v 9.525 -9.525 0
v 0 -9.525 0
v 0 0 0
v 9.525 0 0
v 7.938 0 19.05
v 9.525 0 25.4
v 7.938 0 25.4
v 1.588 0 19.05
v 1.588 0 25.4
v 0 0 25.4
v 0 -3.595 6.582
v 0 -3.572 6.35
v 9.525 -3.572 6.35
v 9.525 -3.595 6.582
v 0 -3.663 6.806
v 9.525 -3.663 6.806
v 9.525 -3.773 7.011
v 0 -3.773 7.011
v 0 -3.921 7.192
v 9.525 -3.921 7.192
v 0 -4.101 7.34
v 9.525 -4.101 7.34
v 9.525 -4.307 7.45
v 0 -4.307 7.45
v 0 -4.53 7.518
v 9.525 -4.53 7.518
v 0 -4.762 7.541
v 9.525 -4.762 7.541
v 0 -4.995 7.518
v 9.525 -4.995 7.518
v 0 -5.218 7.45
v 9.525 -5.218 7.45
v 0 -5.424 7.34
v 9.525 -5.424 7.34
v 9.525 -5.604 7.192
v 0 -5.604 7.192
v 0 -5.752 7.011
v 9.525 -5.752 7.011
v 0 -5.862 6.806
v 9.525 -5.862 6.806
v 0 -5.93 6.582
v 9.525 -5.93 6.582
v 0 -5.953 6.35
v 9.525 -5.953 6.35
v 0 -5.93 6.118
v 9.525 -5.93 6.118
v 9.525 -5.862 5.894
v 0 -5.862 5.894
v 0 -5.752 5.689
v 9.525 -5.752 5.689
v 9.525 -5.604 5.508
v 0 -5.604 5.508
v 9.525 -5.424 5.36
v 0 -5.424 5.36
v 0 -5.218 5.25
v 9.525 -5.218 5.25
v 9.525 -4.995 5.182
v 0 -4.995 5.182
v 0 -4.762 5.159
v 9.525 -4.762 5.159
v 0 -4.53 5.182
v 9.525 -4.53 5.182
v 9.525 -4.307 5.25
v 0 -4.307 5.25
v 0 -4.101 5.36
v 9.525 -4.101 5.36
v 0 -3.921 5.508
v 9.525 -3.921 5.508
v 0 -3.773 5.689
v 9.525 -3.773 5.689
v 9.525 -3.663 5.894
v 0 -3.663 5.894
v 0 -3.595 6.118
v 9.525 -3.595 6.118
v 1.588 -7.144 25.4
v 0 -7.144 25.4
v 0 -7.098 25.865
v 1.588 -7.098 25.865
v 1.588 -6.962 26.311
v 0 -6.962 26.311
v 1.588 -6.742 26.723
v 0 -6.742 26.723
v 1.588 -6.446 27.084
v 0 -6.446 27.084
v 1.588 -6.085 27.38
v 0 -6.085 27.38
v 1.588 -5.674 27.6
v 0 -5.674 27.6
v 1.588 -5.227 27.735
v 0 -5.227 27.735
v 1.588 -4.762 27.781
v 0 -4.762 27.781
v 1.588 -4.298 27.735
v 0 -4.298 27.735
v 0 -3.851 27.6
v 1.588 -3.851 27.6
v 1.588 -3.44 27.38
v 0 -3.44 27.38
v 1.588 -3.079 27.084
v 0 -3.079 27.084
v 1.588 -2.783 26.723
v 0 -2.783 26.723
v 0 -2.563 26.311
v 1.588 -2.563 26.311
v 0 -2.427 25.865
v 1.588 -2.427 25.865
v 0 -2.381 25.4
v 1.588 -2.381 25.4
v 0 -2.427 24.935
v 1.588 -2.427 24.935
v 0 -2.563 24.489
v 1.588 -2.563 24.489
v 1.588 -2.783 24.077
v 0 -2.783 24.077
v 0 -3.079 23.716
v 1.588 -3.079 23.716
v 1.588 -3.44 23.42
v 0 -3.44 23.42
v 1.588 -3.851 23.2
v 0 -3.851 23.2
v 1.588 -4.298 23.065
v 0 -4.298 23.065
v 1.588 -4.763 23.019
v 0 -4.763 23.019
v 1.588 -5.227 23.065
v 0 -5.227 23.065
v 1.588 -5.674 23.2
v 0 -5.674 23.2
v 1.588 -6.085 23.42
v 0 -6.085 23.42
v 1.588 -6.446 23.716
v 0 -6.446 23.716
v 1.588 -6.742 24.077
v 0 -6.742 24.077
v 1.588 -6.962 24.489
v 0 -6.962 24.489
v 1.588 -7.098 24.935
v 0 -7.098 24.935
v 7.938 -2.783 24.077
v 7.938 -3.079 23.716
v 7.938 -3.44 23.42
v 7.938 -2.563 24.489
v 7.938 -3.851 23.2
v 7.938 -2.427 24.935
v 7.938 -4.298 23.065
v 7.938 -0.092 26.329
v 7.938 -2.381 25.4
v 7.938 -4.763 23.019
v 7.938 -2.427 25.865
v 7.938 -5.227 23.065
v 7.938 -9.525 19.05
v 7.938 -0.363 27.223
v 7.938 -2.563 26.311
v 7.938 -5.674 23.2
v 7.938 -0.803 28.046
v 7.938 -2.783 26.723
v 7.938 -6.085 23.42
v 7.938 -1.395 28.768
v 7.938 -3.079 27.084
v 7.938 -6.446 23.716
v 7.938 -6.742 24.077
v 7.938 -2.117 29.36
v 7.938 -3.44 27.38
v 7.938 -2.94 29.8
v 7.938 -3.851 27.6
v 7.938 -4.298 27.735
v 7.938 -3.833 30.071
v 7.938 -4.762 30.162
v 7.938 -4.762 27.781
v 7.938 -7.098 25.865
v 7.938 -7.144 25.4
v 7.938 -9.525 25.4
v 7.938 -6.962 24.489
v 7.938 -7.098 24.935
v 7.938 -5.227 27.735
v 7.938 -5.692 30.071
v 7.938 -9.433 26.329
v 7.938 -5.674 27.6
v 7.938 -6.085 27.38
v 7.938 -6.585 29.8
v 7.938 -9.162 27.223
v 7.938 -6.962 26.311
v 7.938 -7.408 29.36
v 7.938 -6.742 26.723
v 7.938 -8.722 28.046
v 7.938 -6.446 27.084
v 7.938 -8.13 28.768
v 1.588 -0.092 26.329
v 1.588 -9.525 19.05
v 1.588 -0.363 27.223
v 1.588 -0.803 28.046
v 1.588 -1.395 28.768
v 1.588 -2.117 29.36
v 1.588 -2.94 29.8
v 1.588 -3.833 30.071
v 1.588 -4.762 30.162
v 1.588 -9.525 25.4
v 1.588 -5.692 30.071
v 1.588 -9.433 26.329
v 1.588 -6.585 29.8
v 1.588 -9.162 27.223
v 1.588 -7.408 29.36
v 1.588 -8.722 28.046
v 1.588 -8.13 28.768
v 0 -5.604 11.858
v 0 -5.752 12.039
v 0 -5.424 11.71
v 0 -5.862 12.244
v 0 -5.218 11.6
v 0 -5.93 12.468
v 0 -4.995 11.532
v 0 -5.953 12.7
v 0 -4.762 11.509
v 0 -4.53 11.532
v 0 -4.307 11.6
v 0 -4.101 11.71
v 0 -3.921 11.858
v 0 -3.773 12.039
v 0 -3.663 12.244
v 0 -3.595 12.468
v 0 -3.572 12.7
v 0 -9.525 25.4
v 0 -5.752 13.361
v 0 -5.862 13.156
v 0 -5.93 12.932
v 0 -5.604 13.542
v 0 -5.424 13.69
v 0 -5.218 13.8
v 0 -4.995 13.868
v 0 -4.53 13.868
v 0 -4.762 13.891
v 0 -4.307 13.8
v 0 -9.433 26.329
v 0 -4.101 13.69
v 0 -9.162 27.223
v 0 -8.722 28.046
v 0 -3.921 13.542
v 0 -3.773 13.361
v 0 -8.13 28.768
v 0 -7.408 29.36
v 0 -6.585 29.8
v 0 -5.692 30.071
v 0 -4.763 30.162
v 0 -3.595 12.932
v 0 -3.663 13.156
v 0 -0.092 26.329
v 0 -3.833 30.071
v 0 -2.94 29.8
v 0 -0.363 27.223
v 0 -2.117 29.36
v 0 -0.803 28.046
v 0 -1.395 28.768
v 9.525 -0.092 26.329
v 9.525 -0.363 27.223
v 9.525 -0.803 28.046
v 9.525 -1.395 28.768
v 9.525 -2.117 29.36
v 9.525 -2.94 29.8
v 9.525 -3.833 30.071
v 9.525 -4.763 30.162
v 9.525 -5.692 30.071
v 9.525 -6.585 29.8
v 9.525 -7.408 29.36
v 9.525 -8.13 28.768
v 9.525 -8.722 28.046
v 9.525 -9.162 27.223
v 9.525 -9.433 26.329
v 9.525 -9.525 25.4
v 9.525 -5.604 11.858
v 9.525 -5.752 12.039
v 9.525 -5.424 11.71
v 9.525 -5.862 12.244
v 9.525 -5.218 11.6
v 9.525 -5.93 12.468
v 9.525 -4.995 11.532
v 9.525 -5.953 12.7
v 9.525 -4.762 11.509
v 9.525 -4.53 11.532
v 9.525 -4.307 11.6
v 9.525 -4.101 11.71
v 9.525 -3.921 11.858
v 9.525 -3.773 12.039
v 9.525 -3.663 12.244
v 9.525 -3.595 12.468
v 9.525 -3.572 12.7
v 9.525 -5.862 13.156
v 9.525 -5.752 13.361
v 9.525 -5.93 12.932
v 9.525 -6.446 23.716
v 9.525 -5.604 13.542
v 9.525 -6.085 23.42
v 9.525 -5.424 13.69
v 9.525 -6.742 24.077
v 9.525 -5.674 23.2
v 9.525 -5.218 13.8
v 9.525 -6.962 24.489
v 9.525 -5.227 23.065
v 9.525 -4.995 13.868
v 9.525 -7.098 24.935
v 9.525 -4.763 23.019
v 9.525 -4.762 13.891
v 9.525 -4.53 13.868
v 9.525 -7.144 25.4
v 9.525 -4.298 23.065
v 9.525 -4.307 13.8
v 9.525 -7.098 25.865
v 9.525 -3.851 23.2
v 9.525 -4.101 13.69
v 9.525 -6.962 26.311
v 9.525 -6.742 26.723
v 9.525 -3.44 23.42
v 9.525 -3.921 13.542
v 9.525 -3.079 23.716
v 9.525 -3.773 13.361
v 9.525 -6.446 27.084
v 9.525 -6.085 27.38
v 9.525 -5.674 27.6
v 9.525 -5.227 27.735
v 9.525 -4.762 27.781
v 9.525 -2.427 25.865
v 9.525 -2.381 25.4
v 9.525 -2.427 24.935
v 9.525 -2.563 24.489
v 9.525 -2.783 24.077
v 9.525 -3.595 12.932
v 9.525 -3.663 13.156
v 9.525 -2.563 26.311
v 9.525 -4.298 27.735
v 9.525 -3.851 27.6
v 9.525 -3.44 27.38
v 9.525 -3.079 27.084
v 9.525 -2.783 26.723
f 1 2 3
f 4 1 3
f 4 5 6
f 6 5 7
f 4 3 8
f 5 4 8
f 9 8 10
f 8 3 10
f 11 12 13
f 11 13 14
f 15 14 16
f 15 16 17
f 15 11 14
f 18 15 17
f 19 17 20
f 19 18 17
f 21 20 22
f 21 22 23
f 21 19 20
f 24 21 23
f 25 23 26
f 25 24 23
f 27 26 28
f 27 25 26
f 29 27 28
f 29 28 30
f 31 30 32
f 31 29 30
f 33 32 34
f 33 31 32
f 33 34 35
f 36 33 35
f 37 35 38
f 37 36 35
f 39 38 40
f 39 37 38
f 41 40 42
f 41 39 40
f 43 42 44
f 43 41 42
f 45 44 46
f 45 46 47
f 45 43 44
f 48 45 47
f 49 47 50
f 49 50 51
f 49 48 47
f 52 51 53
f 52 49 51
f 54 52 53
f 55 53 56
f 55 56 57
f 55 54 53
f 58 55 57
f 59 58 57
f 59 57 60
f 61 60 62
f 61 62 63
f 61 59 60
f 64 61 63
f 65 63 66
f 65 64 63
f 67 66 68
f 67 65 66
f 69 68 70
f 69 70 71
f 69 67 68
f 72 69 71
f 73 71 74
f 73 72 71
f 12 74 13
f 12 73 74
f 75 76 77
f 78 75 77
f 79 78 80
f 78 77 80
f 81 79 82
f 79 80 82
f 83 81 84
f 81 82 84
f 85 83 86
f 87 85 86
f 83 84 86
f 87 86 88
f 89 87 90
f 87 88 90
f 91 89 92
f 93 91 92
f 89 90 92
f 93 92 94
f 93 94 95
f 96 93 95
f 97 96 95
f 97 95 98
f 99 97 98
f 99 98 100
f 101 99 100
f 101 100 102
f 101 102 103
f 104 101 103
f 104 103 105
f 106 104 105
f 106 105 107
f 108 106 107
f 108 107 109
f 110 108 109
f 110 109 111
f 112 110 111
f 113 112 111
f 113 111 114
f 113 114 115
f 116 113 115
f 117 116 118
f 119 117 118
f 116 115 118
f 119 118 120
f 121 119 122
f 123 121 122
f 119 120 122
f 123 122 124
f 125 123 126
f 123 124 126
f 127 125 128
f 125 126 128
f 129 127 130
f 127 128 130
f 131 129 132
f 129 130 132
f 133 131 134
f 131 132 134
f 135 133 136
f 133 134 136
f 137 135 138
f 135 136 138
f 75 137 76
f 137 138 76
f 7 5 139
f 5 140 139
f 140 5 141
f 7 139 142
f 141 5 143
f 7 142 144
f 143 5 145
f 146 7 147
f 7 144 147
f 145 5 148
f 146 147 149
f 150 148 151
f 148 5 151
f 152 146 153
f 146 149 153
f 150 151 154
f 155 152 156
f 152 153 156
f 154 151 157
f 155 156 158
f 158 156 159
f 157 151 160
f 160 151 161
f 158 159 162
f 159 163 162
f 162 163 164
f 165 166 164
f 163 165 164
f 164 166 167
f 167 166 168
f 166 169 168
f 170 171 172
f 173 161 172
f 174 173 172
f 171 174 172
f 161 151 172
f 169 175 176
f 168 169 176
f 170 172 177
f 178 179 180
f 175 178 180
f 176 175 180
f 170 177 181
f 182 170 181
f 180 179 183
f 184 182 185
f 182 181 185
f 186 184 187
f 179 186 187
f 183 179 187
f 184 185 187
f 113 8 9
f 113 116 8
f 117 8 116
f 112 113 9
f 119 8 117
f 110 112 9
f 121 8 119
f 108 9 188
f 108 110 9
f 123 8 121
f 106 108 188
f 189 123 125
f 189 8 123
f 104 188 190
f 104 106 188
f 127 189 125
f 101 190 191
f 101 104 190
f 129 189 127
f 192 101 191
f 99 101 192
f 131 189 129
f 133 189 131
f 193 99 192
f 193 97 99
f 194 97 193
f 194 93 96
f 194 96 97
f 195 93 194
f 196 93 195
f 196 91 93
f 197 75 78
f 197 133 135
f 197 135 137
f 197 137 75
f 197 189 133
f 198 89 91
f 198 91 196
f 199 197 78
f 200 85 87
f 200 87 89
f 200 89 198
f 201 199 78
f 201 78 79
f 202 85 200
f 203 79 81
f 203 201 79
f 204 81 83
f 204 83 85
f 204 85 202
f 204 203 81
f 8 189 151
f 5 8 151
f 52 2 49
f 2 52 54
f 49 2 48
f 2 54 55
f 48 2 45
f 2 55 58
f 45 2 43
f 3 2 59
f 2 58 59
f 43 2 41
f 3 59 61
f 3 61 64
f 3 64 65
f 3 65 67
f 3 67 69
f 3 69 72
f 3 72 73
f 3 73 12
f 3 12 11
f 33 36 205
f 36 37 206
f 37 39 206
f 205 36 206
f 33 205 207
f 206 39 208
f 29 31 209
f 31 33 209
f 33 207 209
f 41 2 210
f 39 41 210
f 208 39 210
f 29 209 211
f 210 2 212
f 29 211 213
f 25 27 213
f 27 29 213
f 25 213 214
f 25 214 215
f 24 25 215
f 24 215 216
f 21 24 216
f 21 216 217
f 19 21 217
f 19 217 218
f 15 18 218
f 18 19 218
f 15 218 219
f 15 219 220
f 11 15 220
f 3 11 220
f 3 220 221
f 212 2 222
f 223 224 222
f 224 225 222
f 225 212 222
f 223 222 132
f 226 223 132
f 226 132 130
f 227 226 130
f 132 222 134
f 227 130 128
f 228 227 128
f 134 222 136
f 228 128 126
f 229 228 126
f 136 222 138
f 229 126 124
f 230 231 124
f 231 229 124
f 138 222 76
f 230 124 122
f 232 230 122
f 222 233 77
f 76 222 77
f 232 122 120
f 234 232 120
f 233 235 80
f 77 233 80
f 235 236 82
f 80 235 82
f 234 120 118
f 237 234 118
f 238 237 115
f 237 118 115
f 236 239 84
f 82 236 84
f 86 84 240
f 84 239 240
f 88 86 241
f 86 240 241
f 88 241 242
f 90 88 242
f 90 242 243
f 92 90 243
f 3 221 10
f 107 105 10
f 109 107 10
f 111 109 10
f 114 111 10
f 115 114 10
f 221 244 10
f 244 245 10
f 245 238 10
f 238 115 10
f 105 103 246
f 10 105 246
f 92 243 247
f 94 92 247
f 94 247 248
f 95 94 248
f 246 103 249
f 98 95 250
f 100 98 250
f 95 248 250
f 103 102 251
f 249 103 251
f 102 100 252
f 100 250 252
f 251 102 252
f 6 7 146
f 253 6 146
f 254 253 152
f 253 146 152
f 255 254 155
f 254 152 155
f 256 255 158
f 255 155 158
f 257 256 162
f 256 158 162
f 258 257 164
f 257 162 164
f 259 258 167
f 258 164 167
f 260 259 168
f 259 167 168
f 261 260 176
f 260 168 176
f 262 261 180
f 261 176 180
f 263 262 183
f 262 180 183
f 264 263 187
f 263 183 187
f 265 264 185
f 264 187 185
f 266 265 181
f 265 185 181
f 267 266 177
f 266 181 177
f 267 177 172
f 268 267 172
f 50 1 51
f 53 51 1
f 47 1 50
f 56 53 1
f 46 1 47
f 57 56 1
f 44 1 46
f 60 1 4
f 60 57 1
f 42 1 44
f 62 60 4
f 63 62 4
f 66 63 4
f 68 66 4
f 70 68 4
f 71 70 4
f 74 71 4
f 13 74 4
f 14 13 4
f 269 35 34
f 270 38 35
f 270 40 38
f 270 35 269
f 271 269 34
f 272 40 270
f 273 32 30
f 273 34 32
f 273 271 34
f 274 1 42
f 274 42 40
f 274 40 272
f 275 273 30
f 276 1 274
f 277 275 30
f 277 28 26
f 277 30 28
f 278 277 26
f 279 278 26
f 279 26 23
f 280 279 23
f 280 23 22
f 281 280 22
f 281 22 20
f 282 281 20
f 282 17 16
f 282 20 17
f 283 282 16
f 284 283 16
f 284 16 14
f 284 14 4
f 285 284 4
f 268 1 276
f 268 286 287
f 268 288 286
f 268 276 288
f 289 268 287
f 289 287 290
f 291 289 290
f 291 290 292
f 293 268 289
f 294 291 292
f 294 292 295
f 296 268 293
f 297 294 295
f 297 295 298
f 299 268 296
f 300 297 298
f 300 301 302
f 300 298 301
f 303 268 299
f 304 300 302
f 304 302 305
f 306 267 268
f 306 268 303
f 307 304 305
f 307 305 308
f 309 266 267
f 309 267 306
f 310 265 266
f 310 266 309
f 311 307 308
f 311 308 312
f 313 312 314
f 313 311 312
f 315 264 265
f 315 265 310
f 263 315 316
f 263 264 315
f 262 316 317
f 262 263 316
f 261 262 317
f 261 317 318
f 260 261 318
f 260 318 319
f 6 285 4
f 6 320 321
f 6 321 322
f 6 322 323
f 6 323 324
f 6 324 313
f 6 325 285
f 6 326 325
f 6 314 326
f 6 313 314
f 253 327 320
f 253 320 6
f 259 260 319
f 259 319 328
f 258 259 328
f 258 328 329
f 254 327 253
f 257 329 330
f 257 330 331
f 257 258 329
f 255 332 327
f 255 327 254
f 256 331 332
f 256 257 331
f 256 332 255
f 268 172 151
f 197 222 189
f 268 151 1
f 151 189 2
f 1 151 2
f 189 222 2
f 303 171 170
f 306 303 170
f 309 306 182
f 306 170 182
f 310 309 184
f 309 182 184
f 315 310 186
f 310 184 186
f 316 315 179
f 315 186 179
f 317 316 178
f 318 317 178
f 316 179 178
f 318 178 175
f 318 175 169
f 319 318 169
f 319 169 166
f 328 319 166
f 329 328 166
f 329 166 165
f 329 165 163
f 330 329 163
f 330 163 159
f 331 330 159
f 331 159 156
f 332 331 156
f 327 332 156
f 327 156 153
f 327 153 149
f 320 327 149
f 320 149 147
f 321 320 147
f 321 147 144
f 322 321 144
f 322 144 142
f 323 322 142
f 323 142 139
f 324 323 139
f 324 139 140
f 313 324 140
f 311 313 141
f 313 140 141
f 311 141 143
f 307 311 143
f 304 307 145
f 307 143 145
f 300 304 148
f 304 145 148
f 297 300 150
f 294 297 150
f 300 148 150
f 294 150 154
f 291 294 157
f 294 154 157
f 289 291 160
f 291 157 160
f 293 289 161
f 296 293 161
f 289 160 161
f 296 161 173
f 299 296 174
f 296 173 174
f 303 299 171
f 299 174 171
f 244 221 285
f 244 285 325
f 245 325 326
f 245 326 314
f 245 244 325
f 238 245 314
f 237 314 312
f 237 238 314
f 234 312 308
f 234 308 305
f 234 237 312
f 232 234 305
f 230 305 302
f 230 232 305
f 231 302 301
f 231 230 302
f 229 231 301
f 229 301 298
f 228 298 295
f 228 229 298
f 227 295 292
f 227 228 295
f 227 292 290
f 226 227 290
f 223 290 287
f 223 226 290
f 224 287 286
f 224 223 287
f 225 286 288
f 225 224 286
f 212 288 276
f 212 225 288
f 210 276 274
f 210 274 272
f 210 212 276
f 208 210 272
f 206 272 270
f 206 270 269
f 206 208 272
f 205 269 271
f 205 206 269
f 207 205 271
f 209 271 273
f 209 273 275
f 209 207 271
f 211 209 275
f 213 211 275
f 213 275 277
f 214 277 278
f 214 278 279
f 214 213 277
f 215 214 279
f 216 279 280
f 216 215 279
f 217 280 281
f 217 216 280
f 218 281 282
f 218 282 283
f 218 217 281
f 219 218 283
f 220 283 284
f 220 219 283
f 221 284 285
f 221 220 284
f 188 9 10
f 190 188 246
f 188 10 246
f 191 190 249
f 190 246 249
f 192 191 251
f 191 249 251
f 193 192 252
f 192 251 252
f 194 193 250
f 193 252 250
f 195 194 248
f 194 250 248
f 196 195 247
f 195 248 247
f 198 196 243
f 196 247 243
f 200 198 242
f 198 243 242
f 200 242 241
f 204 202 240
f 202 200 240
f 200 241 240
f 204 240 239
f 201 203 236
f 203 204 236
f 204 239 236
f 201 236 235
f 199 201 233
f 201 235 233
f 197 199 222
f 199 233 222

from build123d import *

# Parameters (mm, degrees)
F0_W     = 9.525
F0_H     = 19.05
F0_R     = 1.190625
F1_DEPTH = 9.525
F2_W     = 6.35
F2_H     = 12.7
F3_DEPTH = 9.526


with BuildPart() as f1:
    # F0 (on Right) → F1 (new body)
    with BuildSketch(Plane.YZ):
        with Locations((-4.7625, 9.525)):
            Rectangle(F0_W, F0_H)
        with Locations((-4.7625, 6.35)):
            Circle(F0_R, mode=Mode.SUBTRACT)
        with Locations((-4.7625, 12.7)):
            Circle(F0_R, mode=Mode.SUBTRACT)
        with BuildLine():
            Line((-9.525, 19.05), (0, 19.05))
            Line((0, 19.05), (0, 25.4))
            ThreePointArc((0, 25.4), (-4.7625, 20.6375), (-9.525, 25.4))
            Line((-9.525, 25.4), (-9.525, 19.05))
        make_face()
        with BuildLine():
            ThreePointArc((-9.525, 25.4), (-4.7625, 20.6375), (0, 25.4))
            Line((0, 25.4), (-2.38125, 25.4))
            ThreePointArc((-2.38125, 25.4), (-4.7625, 23.01875), (-7.14375, 25.4))
            Line((-7.14375, 25.4), (-9.525, 25.4))
        make_face()
        with BuildLine():
            Line((-2.38125, 25.4), (0, 25.4))
            ThreePointArc((0, 25.4), (-4.7625, 30.1625), (-9.525, 25.4))
            Line((-9.525, 25.4), (-7.14375, 25.4))
            ThreePointArc((-7.14375, 25.4), (-4.7625, 27.78125), (-2.38125, 25.4))
        make_face()
    extrude(amount=F1_DEPTH)

    # F2 (on face) → F3 (cut, through all)
    with BuildSketch(Plane.XZ.offset(9.525)):
        with Locations((4.7625, 25.4)):
            Rectangle(F2_W, F2_H)
    extrude(amount=-F3_DEPTH, mode=Mode.SUBTRACT)


solid = f1.part
